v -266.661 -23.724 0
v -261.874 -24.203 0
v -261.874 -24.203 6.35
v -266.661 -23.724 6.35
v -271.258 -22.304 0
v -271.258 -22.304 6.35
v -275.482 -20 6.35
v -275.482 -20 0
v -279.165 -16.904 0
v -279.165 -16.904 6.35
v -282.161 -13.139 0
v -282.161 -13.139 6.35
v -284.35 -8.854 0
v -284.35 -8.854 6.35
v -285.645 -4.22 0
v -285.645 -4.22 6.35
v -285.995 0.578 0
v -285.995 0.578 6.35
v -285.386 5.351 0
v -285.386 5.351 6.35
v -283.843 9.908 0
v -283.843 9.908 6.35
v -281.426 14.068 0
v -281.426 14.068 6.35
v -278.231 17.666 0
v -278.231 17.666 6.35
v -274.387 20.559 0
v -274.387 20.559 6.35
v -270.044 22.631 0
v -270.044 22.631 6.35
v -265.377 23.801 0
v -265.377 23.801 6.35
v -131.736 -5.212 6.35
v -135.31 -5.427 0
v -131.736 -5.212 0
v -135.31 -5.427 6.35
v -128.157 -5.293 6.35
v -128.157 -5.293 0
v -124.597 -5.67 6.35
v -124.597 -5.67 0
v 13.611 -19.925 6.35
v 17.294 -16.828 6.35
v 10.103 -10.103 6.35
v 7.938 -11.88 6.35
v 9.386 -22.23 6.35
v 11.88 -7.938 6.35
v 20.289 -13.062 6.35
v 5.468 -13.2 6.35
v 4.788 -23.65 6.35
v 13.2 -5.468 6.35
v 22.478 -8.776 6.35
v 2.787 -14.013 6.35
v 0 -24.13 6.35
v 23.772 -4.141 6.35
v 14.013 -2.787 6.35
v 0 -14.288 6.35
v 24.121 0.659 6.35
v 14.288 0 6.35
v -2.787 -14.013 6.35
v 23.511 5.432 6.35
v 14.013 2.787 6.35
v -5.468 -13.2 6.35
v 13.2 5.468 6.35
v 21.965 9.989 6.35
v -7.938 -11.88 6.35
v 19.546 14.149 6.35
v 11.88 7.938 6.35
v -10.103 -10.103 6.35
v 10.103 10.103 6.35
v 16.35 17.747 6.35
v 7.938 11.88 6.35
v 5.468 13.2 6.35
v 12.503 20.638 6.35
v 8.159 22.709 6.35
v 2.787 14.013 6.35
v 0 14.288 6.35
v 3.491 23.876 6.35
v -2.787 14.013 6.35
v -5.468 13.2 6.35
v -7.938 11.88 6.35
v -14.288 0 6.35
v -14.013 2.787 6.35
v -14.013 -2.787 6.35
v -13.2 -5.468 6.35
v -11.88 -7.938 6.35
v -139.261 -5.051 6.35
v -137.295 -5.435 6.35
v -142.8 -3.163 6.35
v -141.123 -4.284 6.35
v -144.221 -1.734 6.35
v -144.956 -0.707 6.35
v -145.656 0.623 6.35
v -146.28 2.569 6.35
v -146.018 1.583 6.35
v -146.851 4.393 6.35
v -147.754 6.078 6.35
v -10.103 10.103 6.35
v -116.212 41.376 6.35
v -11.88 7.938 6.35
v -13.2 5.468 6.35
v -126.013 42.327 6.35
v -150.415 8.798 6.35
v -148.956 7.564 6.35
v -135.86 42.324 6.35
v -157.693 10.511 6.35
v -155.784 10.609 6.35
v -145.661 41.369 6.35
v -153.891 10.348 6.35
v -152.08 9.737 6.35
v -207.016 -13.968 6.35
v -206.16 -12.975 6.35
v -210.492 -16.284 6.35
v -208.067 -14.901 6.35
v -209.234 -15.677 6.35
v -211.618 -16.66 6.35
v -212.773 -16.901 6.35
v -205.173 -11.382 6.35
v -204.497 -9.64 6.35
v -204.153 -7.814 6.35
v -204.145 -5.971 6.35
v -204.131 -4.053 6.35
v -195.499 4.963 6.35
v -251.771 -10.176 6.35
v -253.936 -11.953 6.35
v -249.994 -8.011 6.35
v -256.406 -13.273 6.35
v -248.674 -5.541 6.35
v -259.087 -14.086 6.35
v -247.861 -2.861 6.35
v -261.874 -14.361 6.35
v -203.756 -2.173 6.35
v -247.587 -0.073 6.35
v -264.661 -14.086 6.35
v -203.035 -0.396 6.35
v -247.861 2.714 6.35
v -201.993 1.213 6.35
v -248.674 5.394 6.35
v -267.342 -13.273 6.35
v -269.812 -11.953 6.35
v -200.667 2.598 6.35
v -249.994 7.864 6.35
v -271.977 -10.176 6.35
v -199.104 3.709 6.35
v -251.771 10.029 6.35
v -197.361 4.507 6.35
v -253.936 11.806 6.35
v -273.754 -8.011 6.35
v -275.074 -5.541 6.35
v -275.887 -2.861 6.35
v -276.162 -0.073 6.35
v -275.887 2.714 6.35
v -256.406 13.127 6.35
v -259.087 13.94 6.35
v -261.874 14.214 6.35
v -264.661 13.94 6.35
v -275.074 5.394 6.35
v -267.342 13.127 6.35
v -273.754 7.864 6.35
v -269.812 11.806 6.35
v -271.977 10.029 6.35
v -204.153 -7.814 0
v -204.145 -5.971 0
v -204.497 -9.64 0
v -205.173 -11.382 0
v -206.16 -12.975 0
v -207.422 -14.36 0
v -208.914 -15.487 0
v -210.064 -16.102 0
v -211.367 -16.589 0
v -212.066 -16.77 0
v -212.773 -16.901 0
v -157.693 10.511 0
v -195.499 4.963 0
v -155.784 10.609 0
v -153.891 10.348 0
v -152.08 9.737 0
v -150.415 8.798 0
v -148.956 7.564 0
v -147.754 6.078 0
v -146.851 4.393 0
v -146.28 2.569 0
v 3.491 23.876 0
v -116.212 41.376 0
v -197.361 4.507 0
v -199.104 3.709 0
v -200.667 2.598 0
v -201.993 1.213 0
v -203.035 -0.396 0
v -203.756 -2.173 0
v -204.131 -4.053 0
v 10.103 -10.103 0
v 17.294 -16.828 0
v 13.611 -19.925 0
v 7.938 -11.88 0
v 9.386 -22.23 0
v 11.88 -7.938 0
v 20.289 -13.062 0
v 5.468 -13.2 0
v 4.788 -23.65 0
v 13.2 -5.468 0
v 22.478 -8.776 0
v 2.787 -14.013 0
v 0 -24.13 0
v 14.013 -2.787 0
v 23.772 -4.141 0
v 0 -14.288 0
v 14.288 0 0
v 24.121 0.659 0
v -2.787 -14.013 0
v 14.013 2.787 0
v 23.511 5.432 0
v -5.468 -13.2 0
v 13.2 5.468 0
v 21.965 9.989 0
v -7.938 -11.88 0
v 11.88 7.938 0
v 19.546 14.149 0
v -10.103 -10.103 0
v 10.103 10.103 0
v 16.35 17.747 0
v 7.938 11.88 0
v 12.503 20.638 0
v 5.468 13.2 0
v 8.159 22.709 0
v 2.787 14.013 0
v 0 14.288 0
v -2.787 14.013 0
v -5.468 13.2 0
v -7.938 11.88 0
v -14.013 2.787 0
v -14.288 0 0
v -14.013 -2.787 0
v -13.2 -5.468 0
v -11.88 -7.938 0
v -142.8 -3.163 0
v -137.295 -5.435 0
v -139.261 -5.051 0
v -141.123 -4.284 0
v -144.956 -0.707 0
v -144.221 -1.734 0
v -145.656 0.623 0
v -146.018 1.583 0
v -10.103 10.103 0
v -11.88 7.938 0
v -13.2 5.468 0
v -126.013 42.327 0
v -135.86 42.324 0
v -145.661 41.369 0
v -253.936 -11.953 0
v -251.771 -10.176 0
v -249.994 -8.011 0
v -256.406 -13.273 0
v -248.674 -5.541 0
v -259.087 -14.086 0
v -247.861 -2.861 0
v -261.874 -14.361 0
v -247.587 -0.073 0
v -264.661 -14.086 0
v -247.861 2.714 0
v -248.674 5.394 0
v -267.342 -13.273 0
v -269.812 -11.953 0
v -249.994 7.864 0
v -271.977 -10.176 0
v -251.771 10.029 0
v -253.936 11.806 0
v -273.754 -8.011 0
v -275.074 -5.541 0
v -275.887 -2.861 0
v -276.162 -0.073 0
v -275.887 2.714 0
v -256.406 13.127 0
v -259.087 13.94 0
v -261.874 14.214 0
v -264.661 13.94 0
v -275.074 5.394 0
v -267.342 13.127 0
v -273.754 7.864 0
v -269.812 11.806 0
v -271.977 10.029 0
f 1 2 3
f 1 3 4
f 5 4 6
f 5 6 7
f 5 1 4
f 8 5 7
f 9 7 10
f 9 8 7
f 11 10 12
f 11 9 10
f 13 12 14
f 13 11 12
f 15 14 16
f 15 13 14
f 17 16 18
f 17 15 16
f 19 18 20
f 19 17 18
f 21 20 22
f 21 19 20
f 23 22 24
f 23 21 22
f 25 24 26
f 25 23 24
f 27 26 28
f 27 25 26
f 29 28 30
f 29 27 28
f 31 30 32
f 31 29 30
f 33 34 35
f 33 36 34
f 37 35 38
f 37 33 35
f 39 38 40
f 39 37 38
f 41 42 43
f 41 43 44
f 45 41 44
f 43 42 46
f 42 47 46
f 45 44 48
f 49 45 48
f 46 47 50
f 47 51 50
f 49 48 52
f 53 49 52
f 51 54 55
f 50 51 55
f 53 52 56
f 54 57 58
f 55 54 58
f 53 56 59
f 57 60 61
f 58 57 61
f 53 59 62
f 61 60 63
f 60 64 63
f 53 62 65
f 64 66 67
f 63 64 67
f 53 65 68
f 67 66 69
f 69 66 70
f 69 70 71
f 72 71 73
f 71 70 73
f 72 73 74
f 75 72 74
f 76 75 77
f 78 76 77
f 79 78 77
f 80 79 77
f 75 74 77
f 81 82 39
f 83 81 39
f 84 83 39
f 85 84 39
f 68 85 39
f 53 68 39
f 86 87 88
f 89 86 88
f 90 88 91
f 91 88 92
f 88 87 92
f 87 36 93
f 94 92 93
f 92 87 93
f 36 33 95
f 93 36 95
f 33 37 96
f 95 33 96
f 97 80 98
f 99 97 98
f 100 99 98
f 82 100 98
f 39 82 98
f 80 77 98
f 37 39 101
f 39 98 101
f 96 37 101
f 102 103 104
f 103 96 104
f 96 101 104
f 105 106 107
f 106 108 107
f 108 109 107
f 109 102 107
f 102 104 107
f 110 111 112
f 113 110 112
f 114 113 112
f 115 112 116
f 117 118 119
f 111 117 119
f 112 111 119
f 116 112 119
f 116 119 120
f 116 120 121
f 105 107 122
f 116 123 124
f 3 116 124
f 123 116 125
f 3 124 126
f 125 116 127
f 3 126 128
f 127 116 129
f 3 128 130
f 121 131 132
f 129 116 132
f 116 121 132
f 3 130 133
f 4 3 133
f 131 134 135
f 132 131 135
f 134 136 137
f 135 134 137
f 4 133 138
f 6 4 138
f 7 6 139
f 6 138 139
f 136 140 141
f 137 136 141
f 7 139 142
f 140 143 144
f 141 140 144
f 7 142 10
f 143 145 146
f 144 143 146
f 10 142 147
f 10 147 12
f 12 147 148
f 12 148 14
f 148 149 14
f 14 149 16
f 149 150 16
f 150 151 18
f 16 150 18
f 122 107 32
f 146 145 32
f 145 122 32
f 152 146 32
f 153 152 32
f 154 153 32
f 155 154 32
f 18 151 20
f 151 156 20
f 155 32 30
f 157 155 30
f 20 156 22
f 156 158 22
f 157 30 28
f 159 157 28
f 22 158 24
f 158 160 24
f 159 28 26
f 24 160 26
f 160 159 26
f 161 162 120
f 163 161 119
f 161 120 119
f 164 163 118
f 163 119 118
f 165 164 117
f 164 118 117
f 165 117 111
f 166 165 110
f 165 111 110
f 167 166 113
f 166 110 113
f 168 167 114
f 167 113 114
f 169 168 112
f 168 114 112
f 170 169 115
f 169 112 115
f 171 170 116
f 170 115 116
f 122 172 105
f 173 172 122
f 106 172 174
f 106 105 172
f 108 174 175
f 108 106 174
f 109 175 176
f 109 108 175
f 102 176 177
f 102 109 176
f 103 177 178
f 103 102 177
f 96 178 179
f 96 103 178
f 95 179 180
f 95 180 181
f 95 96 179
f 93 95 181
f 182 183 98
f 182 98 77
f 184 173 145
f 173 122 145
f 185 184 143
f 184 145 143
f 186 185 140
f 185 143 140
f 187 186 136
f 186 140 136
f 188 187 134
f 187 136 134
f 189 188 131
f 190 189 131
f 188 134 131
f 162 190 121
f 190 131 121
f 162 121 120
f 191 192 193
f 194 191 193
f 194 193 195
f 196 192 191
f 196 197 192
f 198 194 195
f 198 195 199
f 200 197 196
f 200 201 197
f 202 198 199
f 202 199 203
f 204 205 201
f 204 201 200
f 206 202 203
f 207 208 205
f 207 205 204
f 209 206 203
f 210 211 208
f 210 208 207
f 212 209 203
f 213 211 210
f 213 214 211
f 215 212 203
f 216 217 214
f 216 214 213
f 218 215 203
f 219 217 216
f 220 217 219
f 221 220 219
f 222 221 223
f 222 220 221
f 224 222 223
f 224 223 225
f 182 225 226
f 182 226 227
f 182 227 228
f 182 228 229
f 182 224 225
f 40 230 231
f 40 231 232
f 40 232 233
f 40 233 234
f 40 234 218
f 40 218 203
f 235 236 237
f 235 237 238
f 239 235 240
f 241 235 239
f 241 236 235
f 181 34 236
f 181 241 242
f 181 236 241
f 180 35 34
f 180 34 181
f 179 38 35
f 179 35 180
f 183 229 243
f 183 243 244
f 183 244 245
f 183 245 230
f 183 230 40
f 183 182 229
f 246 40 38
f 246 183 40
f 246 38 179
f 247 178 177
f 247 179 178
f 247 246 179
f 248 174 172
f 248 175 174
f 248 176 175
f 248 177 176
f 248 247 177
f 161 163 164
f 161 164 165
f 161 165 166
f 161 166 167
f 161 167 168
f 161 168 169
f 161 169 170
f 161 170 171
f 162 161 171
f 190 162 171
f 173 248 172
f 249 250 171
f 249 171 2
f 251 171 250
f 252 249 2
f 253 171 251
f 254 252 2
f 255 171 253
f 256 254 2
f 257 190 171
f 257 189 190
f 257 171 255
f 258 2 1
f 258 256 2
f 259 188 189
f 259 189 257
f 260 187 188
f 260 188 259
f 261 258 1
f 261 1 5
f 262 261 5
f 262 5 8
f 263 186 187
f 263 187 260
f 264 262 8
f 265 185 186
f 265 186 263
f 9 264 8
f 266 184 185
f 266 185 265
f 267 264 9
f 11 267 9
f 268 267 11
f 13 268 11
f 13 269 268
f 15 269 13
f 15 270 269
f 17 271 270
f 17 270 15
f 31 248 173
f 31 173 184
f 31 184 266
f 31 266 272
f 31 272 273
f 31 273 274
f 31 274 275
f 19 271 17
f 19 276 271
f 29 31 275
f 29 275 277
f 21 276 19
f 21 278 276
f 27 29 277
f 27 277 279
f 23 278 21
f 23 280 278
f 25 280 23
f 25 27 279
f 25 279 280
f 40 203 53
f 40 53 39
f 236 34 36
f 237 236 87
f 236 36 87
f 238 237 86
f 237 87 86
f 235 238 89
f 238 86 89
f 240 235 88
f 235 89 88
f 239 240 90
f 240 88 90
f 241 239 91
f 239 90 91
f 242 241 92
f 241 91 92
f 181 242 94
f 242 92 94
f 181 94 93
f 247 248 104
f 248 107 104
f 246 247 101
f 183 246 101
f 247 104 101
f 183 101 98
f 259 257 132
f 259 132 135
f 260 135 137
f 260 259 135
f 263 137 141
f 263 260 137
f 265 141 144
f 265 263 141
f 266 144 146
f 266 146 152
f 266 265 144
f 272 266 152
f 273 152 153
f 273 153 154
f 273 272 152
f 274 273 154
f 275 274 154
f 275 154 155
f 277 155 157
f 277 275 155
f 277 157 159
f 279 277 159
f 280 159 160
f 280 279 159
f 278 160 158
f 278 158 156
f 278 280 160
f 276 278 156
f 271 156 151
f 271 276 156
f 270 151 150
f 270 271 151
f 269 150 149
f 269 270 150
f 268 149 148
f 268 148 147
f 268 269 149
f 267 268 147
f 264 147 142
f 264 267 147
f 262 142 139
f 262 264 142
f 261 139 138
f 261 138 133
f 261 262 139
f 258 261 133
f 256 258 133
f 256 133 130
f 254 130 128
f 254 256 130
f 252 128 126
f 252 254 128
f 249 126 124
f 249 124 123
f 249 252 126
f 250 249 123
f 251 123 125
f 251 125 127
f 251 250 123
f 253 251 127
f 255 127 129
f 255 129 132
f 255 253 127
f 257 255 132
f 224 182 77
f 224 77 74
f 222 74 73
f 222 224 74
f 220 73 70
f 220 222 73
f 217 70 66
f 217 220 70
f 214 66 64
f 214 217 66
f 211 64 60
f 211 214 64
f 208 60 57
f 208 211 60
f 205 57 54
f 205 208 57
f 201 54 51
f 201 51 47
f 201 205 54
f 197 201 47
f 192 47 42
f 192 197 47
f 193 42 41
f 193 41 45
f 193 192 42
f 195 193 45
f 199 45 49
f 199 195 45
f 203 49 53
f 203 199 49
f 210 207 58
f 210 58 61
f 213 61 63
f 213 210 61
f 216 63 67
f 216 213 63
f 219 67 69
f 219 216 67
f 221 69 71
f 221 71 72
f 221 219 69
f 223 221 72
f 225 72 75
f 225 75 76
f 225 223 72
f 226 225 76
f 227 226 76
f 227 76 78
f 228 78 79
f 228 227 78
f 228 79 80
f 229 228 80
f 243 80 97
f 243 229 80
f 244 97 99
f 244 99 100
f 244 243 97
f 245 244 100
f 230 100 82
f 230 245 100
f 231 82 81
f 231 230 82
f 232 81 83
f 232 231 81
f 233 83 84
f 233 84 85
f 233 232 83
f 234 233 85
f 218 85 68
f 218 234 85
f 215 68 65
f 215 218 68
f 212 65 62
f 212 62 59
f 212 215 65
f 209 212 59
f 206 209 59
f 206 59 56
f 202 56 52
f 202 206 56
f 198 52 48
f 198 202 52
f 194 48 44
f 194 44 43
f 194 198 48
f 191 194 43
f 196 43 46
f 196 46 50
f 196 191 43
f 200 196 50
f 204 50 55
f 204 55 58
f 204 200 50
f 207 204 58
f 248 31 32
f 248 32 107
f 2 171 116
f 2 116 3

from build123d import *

# Parameters (mm, degrees)
SKETCH1_R           = 14.2875
BOSS_EXTRUDE1_DEPTH = 6.35
FILLET2_R           = 101.6
FILLET4_R           = 10.16
FILLET5_R           = 10.16
FILLET6_R           = 10.16
FILLET7_R           = 43.18
FILLET8_R           = 10.16


with BuildPart() as part:
    # Sketch1 → Boss-Extrude1 (new body)
    with BuildSketch(Plane.XY):
        with BuildLine():
            Line((-265.377394078, 23.800923648), (-130.937, 43.529137522))
            Line((-130.937, 43.529137522), (3.490632878, 23.876188601))
            ThreePointArc((3.490632878, 23.876188601), (24.066463502, -1.749924149), (0, -24.13))
            Line((0, -24.13), (-130.937, -4.730862478))
            Line((-130.937, -4.730862478), (-144.883464555, -6.804936239))
            Line((-144.883464555, -6.804936239), (-147.640874452, 11.985780223))
            Line((-147.640874452, 11.985780223), (-205.570538861, 3.484995791))
            Line((-205.570538861, 3.484995791), (-202.760210881, -15.412181497))
            Line((-202.760210881, -15.412181497), (-261.874, -24.203395818))
            ThreePointArc((-261.874, -24.203395818), (-285.939994979, -1.829751605), (-265.377394078, 23.800923648))
        make_face()
        with Locations((-261.874, -0.073395818)):
            Circle(SKETCH1_R, mode=Mode.SUBTRACT)
        Circle(SKETCH1_R, mode=Mode.SUBTRACT)
    extrude(amount=BOSS_EXTRUDE1_DEPTH)

    # Fillet2
    fillet2_edges = [part.edges().sort_by_distance(p)[0] for p in [
        (-130.937, 43.529137522, 3.175),
    ]]
    fillet(fillet2_edges, radius=FILLET2_R)

    # Fillet4
    fillet4_edges = [part.edges().sort_by_distance(p)[0] for p in [
        (-147.640874452, 11.985780223, 3.175),
    ]]
    fillet(fillet4_edges, radius=FILLET4_R)

    # Fillet5
    fillet5_edges = [part.edges().sort_by_distance(p)[0] for p in [
        (-205.570538861, 3.484995791, 3.175),
    ]]
    fillet(fillet5_edges, radius=FILLET5_R)

    # Fillet6
    fillet6_edges = [part.edges().sort_by_distance(p)[0] for p in [
        (-202.760210881, -15.412181497, 3.175),
    ]]
    fillet(fillet6_edges, radius=FILLET6_R)

    # Fillet7
    fillet7_edges = [part.edges().sort_by_distance(p)[0] for p in [
        (-130.937, -4.730862478, 3.175),
    ]]
    fillet(fillet7_edges, radius=FILLET7_R)

    # Fillet8
    fillet8_edges = [part.edges().sort_by_distance(p)[0] for p in [
        (-144.883464555, -6.804936239, 3.175),
    ]]
    fillet(fillet8_edges, radius=FILLET8_R)


solid = part.part
